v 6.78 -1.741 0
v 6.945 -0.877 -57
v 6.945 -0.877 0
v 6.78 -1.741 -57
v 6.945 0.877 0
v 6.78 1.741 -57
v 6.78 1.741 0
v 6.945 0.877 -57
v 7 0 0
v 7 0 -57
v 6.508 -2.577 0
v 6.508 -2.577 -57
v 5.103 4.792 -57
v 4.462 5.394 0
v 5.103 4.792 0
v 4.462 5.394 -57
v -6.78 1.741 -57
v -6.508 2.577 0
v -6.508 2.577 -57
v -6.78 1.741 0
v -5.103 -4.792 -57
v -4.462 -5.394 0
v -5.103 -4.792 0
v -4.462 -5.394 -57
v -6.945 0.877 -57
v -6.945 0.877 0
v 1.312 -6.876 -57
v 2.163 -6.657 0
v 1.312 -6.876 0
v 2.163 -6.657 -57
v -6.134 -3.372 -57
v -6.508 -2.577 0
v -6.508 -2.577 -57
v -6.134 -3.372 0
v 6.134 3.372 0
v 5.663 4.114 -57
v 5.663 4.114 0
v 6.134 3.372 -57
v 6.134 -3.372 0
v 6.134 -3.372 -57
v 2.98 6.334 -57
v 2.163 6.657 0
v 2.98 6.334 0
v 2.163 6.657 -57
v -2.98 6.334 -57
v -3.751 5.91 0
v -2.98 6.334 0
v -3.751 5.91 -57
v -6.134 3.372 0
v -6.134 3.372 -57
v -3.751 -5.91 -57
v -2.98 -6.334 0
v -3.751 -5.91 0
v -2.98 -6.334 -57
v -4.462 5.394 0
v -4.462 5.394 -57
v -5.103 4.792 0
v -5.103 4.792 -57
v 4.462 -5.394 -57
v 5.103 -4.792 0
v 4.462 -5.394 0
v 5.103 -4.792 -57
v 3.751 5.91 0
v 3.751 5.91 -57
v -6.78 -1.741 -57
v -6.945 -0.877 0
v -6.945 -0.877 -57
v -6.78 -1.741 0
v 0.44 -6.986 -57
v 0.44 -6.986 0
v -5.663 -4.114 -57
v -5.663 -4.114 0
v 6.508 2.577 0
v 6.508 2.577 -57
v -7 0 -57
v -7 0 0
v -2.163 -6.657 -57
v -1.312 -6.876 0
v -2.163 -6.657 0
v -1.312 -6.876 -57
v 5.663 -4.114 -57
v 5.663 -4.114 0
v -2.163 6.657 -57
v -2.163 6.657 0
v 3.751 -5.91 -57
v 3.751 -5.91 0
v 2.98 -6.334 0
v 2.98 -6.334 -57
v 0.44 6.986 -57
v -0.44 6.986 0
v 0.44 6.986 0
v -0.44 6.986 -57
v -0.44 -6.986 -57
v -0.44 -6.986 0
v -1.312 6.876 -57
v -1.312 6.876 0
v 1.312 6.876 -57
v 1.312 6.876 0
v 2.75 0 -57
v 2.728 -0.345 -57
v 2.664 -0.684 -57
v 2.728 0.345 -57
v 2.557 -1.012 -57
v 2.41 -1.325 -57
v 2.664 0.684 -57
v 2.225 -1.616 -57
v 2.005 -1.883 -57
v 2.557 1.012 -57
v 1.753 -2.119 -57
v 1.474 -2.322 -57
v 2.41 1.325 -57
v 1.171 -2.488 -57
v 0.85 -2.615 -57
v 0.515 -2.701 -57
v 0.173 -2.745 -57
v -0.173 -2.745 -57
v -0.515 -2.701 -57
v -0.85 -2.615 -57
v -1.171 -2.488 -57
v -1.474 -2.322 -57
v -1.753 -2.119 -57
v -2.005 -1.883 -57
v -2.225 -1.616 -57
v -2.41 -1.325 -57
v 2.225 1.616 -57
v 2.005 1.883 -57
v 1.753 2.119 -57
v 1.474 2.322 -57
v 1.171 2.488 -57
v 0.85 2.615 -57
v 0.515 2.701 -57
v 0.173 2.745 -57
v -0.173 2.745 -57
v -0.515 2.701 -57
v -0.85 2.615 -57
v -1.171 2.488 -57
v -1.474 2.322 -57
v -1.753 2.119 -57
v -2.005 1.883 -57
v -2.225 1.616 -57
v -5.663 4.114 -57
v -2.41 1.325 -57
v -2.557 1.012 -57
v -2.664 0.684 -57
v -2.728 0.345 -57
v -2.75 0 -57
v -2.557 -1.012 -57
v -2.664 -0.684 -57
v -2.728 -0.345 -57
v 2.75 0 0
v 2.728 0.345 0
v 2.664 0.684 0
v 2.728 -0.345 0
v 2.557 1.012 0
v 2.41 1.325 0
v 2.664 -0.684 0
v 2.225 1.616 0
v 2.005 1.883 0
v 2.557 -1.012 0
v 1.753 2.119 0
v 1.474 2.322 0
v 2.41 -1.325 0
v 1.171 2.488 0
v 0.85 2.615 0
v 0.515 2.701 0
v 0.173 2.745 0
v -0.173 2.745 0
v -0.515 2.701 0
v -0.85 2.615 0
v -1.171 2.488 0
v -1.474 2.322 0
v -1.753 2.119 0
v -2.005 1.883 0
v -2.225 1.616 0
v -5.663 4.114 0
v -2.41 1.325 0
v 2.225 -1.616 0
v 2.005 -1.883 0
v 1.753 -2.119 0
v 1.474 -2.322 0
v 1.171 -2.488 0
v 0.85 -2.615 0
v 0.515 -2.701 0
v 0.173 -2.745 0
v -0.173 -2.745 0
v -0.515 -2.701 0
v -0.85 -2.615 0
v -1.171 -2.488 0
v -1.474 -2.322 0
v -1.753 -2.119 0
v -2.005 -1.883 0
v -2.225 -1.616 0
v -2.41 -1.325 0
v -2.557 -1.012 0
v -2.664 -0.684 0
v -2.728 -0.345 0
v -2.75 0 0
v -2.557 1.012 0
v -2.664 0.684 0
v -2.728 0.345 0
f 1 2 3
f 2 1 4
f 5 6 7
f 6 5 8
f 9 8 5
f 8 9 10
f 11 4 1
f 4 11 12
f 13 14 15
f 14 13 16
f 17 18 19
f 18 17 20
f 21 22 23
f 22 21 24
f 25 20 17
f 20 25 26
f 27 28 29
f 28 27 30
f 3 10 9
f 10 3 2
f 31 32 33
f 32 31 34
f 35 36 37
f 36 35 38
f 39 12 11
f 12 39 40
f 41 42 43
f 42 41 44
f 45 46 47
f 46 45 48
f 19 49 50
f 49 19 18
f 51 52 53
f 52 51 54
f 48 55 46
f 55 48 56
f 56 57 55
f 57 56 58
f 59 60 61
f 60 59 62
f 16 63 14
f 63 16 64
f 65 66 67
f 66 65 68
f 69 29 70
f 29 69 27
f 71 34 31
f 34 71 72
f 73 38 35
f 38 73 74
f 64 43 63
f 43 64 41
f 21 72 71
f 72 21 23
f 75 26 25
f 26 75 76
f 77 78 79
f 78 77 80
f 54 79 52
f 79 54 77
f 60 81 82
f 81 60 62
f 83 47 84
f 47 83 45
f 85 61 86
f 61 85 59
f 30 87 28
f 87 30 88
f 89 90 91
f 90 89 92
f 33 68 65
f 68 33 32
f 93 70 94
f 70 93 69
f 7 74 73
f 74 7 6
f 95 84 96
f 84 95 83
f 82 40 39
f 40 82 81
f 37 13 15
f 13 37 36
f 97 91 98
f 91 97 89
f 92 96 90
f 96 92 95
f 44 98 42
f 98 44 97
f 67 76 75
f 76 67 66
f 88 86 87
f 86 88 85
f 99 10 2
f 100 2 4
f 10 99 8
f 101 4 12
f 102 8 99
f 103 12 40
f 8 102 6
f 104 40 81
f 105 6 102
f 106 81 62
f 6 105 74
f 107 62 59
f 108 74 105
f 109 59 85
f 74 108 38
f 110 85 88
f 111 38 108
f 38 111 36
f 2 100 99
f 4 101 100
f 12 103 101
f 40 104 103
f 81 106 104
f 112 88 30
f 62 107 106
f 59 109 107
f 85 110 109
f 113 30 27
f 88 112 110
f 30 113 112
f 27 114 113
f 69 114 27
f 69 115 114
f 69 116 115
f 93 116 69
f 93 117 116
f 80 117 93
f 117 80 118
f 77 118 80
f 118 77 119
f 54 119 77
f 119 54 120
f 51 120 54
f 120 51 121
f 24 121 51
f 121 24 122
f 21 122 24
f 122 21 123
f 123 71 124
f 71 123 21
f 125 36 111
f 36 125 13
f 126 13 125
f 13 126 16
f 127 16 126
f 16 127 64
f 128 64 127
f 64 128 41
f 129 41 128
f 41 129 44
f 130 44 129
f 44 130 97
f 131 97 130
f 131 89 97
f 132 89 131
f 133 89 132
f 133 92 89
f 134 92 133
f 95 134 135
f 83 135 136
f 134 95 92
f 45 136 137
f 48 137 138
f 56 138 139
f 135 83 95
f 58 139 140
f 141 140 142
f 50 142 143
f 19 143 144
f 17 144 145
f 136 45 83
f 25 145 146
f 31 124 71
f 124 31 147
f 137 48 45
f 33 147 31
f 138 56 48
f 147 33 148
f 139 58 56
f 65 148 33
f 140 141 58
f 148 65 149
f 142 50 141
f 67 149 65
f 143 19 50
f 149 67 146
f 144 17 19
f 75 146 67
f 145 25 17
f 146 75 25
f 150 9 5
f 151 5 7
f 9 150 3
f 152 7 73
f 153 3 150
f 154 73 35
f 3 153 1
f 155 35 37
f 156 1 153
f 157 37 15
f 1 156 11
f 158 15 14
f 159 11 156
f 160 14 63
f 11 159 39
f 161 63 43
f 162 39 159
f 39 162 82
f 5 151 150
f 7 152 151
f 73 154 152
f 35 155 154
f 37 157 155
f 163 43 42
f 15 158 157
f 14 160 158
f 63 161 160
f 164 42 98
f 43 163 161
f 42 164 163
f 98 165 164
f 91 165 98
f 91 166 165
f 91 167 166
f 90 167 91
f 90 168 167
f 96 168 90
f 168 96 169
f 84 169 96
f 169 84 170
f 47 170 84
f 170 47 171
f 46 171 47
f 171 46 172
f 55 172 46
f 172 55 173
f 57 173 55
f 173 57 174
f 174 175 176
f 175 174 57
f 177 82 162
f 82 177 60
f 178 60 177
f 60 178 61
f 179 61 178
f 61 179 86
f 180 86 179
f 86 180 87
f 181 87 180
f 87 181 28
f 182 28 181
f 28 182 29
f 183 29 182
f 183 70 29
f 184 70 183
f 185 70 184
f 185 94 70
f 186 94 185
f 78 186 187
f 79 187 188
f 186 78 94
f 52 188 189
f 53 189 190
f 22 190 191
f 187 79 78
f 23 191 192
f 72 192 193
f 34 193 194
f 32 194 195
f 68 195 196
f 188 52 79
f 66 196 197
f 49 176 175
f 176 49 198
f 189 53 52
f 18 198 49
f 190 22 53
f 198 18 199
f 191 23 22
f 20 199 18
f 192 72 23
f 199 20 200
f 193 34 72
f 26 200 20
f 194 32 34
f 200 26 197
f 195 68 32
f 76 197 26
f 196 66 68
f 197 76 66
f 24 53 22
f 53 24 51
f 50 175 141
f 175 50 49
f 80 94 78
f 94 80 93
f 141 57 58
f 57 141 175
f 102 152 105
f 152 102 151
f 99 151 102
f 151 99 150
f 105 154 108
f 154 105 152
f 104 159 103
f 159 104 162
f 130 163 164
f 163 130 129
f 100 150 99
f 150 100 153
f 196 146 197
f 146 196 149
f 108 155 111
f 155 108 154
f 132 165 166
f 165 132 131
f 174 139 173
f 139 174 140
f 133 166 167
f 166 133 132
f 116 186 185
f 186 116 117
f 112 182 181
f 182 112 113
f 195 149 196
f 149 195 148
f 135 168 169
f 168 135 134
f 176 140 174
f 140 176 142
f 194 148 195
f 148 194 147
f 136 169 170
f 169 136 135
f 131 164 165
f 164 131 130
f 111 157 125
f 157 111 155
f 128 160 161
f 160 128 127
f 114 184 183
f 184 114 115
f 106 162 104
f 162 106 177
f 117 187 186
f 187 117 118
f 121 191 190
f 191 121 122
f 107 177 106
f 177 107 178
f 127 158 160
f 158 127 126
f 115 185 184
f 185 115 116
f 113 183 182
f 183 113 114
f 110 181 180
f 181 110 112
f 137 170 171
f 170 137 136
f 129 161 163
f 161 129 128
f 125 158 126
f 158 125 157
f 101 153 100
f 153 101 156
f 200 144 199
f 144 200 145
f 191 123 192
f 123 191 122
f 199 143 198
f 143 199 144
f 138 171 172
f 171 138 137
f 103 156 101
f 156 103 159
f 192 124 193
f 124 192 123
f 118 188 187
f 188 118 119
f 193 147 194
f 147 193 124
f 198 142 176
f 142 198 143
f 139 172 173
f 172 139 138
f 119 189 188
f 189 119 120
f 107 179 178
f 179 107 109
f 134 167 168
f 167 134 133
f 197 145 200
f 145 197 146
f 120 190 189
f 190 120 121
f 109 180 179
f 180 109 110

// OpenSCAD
$fn = 50;


difference() {
	union() {
		translate(v = [0, 0, -57.0000000000]) {
			cylinder(h = 57, r = 7.0000000000);
		}
		cylinder(h = 0, r = 17.0000000000);
	}
	union() {
		#translate(v = [0, 0, -57]) {
			cylinder(h = 57, r = 2.7500000000);
		}
	}
}
